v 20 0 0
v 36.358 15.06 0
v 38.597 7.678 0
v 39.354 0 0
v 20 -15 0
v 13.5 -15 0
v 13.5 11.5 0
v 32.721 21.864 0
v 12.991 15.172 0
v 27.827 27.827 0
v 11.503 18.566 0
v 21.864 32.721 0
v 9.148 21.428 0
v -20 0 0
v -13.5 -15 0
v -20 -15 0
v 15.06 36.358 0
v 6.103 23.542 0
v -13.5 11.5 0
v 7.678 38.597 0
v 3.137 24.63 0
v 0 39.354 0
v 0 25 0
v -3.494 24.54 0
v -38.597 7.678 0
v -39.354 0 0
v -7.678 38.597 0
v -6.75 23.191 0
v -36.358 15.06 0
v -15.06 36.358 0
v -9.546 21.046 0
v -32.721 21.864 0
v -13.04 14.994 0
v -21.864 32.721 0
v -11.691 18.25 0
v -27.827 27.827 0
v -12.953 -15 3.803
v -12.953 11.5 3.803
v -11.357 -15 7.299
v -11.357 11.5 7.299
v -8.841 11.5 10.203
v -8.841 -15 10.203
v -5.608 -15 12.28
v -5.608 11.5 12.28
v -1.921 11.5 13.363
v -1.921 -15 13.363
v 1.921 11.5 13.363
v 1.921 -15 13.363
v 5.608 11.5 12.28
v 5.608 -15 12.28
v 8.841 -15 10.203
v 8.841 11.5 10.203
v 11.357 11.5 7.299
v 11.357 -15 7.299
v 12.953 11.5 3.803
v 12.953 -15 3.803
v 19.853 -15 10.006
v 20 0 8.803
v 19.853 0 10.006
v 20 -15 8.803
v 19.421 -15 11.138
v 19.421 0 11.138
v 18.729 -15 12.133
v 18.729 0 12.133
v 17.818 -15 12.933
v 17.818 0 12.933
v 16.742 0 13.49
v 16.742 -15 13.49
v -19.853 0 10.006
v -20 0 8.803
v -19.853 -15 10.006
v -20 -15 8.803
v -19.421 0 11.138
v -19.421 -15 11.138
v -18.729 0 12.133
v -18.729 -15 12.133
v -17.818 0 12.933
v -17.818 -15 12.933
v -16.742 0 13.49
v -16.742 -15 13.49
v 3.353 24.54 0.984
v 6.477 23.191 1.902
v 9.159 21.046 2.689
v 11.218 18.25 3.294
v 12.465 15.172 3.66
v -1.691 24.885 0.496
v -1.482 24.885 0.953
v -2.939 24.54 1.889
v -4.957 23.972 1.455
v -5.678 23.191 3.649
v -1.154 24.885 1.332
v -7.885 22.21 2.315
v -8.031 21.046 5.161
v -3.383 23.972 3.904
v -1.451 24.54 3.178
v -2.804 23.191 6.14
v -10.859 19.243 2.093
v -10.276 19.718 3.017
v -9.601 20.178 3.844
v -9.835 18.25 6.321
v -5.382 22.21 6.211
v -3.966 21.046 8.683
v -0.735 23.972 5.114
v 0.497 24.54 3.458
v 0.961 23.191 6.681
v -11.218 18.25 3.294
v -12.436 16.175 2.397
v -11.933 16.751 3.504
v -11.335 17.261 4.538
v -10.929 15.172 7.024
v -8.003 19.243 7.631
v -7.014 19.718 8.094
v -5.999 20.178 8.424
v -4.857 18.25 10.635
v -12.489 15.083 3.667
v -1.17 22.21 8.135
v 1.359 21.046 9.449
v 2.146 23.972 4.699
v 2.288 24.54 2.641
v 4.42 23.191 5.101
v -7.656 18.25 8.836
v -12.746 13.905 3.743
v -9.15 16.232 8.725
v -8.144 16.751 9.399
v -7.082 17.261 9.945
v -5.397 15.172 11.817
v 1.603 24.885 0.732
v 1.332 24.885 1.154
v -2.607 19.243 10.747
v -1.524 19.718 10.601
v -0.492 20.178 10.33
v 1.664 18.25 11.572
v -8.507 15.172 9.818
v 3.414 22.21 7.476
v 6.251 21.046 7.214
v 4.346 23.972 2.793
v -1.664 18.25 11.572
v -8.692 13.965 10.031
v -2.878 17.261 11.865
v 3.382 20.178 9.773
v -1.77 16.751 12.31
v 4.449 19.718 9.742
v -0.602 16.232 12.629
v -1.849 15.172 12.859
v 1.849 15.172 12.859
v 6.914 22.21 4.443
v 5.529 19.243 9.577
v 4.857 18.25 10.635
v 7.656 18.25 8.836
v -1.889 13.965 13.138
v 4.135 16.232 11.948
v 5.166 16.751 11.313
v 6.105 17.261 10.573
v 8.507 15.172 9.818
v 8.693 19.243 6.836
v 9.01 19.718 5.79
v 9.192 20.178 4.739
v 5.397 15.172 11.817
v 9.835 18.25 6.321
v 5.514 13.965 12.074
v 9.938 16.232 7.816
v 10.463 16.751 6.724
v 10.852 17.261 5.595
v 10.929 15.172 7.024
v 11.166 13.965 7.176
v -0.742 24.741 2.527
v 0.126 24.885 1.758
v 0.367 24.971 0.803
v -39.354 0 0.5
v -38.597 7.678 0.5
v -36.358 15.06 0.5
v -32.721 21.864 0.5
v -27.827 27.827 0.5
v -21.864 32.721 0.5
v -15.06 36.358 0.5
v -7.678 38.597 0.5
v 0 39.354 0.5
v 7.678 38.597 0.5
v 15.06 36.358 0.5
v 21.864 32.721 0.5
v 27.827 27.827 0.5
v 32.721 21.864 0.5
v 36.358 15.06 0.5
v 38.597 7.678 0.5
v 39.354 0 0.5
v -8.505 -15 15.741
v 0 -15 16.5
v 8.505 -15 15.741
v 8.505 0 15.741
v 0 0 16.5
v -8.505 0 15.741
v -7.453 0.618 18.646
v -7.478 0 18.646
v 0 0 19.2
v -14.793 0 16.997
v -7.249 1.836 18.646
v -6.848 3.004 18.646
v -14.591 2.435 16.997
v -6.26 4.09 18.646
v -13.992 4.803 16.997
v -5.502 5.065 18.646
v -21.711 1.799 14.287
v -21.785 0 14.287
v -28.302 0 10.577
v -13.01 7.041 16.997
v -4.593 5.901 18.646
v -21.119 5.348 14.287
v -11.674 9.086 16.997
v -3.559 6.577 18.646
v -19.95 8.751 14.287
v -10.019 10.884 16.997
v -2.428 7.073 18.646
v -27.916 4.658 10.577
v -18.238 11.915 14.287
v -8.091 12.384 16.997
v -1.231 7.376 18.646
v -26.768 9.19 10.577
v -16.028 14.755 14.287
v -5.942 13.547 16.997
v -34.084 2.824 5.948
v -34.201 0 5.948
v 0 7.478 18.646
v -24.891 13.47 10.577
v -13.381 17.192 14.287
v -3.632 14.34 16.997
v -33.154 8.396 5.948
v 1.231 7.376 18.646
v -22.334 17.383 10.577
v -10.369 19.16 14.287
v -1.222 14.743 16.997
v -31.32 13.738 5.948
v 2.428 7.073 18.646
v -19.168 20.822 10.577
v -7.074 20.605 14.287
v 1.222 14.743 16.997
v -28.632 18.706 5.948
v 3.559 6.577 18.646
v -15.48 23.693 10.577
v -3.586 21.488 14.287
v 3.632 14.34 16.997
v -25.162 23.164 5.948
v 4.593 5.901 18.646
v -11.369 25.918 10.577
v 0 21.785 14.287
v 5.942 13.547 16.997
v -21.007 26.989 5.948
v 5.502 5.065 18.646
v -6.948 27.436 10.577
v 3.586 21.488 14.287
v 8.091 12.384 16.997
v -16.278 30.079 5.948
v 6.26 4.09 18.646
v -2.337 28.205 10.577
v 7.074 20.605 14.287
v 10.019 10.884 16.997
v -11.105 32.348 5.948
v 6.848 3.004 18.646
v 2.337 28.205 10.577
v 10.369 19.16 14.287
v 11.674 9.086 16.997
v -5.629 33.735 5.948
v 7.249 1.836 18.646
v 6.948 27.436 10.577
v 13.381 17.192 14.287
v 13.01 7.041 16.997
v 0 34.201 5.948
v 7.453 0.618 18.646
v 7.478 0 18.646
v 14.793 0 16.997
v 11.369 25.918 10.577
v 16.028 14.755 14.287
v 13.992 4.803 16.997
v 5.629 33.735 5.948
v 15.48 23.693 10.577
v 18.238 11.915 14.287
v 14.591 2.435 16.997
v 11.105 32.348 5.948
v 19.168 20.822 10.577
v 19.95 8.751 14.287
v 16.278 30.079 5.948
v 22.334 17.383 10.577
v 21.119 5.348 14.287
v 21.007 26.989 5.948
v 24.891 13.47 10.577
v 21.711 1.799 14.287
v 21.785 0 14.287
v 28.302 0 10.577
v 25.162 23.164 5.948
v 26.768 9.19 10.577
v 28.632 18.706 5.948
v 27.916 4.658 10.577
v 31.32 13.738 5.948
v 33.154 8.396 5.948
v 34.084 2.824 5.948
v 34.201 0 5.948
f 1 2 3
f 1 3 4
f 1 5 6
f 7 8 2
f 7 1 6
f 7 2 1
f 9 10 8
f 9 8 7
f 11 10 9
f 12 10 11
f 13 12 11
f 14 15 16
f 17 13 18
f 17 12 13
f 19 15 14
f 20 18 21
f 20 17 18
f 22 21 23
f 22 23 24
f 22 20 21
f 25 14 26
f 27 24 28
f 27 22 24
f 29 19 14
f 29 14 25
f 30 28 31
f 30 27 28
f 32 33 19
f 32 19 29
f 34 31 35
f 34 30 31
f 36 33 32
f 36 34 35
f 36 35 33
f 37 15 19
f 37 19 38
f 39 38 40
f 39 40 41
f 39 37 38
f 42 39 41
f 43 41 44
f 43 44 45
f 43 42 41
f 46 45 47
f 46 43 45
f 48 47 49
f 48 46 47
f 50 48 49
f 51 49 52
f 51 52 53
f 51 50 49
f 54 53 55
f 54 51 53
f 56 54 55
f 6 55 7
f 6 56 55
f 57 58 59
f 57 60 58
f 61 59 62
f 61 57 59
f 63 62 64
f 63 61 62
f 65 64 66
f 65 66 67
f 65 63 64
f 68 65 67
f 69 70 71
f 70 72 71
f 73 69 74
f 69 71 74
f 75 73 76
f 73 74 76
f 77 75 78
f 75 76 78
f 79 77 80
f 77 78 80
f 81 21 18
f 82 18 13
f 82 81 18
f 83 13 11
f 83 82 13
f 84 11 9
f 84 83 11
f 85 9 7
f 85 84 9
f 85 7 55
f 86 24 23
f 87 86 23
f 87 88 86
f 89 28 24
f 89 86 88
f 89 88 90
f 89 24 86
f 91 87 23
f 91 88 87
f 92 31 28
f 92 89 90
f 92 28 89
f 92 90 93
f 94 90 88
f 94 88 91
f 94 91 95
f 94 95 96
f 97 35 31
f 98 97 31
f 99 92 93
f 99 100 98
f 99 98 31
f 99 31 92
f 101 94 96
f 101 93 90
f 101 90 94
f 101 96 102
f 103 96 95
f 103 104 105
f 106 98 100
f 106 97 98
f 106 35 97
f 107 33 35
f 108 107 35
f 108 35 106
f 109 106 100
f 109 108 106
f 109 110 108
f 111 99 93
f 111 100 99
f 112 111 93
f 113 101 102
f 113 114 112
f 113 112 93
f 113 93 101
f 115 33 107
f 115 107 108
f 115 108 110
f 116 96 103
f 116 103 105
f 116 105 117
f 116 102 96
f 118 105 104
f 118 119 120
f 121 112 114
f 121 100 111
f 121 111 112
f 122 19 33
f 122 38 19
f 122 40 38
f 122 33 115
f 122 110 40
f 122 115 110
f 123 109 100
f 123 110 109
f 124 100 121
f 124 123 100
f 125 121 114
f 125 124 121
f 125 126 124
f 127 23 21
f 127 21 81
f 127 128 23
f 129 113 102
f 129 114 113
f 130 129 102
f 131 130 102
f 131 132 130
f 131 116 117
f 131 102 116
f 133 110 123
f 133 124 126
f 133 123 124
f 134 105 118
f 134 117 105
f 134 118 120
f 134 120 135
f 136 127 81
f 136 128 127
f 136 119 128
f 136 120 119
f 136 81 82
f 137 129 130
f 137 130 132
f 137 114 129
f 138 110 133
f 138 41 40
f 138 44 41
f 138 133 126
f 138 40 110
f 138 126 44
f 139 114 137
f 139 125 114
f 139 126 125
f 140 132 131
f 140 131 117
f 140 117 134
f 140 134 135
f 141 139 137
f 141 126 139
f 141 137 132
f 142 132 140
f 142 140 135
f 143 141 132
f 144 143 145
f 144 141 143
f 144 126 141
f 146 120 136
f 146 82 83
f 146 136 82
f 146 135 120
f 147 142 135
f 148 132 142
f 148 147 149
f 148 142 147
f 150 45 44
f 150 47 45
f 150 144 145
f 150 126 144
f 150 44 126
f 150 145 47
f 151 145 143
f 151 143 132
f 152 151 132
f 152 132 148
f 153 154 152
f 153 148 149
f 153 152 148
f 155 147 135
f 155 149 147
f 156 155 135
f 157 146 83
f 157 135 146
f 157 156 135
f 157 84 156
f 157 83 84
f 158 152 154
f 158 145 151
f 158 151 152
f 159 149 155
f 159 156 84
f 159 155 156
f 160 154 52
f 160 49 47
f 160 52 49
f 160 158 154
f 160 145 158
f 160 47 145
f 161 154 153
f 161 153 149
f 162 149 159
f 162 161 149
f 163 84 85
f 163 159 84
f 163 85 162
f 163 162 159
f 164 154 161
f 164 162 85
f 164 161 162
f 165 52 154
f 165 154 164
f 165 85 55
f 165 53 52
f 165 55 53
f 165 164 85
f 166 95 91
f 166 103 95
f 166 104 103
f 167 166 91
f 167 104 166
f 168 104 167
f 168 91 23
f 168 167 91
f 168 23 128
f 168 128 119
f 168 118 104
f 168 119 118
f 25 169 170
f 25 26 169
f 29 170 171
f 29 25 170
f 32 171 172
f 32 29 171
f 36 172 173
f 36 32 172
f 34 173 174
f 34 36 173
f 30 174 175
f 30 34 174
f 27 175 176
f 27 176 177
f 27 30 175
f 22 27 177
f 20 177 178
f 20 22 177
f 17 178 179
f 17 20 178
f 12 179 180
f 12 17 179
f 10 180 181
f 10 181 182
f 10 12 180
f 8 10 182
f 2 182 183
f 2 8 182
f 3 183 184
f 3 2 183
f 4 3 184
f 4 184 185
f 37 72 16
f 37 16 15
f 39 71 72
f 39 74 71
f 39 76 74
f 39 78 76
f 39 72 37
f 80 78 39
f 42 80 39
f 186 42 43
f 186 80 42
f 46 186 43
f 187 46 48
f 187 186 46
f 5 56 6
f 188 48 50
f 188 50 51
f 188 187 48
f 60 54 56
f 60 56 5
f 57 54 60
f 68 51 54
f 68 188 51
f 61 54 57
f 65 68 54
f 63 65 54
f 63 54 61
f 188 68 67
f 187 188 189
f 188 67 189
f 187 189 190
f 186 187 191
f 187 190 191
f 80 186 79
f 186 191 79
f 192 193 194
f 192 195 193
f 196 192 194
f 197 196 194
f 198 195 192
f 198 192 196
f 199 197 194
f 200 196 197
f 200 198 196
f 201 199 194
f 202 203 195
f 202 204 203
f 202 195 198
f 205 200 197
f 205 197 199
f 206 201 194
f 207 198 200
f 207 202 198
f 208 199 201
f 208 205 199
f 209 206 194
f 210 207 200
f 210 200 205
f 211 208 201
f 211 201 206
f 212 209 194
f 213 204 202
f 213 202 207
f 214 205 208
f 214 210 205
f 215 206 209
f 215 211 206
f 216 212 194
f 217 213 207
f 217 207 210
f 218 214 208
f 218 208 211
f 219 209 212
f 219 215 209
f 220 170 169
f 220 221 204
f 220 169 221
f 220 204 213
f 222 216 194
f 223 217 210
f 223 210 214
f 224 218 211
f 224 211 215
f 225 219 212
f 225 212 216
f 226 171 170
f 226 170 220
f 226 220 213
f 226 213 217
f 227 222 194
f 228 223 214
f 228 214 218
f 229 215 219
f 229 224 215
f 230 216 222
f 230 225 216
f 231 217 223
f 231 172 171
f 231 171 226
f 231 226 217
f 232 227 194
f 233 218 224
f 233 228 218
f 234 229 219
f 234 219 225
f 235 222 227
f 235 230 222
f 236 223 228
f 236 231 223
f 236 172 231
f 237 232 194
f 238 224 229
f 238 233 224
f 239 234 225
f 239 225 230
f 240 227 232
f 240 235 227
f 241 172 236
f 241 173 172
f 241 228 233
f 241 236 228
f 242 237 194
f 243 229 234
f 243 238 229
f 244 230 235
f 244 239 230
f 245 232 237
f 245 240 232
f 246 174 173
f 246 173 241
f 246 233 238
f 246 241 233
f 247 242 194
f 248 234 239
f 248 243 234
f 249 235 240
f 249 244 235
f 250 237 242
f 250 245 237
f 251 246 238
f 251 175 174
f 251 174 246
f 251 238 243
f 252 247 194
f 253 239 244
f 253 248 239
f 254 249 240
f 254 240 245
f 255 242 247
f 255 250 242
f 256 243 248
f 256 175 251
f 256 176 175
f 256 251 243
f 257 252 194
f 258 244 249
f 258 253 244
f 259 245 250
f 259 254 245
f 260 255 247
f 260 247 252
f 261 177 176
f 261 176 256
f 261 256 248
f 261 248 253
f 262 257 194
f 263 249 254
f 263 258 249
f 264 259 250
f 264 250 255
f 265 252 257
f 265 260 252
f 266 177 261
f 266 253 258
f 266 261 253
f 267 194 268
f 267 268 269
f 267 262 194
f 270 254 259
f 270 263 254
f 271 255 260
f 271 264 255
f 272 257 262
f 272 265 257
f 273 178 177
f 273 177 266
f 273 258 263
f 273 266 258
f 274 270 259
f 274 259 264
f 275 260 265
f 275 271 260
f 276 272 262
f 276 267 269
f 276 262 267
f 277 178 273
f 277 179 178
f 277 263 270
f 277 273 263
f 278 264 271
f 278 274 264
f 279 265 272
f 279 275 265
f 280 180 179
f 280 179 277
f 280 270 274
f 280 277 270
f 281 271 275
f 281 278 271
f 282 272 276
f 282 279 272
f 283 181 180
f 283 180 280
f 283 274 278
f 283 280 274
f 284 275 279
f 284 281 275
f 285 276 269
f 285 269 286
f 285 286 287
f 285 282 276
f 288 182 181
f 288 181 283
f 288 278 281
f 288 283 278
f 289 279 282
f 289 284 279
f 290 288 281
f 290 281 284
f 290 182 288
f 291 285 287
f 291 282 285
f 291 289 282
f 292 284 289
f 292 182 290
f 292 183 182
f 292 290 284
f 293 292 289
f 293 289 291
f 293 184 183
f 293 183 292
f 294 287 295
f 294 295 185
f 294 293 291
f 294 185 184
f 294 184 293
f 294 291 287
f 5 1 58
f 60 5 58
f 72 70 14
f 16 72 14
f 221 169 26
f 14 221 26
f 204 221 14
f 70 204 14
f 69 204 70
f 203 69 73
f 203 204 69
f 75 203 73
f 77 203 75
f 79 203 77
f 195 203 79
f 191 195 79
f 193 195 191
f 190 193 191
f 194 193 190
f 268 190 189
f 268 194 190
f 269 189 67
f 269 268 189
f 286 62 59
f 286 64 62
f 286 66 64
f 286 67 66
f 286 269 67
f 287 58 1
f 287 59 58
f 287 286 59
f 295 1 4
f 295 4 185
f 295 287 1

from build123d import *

# Parameters (mm, degrees)
F2_ANGLE = 180
F4_DEPTH = 15
F7_R     = 5


with BuildPart() as f2:
    # F1 (on Front) → F2 (revolve)
    with BuildSketch(Plane.XZ):
        with BuildLine():
            Line((-39.353583, 0.5), (-39.353583, 0))
            Line((-39.353583, 0), (0, 0))
            Line((0, 0), (0, 19.2))
            ThreePointArc((0, 19.2), (-21.785284, 14.28726), (-39.353583, 0.5))
        make_face()
    revolve(axis=Axis((0, 0, 9.6), (0, 0, -1)), revolution_arc=F2_ANGLE)

    # F3 (on Front) → F4 (join)
    with BuildSketch(Plane.XZ):
        with BuildLine():
            Line((20, 0), (20, 12.140763))
            ThreePointArc((20, 12.140763), (0, 16.5), (-20, 12.140763))
            Line((-20, 12.140763), (-20, 0))
            Line((-20, 0), (20, 0))
        make_face()
    extrude(amount=F4_DEPTH)

    # F5 (on Top) → F6 (revolve, cut)
    with BuildSketch(Plane.XY):
        with BuildLine():
            Line((-13.5, -15), (0, -15))
            Line((0, -15), (0, 25))
            ThreePointArc((0, 25), (-9.545942, 21.045942), (-13.5, 11.5))
            Line((-13.5, 11.5), (-13.5, -15))
        make_face()
    revolve(axis=Axis((0, 5, 0), (0, 1, 0)), mode=Mode.SUBTRACT)

    # F7
    f7_edges = [f2.edges().sort_by_distance(p)[0] for p in [
        (-20, -7.5, 12.140763),
        (20, -7.5, 12.140763),
    ]]
    fillet(f7_edges, radius=F7_R)


solid = f2.part
